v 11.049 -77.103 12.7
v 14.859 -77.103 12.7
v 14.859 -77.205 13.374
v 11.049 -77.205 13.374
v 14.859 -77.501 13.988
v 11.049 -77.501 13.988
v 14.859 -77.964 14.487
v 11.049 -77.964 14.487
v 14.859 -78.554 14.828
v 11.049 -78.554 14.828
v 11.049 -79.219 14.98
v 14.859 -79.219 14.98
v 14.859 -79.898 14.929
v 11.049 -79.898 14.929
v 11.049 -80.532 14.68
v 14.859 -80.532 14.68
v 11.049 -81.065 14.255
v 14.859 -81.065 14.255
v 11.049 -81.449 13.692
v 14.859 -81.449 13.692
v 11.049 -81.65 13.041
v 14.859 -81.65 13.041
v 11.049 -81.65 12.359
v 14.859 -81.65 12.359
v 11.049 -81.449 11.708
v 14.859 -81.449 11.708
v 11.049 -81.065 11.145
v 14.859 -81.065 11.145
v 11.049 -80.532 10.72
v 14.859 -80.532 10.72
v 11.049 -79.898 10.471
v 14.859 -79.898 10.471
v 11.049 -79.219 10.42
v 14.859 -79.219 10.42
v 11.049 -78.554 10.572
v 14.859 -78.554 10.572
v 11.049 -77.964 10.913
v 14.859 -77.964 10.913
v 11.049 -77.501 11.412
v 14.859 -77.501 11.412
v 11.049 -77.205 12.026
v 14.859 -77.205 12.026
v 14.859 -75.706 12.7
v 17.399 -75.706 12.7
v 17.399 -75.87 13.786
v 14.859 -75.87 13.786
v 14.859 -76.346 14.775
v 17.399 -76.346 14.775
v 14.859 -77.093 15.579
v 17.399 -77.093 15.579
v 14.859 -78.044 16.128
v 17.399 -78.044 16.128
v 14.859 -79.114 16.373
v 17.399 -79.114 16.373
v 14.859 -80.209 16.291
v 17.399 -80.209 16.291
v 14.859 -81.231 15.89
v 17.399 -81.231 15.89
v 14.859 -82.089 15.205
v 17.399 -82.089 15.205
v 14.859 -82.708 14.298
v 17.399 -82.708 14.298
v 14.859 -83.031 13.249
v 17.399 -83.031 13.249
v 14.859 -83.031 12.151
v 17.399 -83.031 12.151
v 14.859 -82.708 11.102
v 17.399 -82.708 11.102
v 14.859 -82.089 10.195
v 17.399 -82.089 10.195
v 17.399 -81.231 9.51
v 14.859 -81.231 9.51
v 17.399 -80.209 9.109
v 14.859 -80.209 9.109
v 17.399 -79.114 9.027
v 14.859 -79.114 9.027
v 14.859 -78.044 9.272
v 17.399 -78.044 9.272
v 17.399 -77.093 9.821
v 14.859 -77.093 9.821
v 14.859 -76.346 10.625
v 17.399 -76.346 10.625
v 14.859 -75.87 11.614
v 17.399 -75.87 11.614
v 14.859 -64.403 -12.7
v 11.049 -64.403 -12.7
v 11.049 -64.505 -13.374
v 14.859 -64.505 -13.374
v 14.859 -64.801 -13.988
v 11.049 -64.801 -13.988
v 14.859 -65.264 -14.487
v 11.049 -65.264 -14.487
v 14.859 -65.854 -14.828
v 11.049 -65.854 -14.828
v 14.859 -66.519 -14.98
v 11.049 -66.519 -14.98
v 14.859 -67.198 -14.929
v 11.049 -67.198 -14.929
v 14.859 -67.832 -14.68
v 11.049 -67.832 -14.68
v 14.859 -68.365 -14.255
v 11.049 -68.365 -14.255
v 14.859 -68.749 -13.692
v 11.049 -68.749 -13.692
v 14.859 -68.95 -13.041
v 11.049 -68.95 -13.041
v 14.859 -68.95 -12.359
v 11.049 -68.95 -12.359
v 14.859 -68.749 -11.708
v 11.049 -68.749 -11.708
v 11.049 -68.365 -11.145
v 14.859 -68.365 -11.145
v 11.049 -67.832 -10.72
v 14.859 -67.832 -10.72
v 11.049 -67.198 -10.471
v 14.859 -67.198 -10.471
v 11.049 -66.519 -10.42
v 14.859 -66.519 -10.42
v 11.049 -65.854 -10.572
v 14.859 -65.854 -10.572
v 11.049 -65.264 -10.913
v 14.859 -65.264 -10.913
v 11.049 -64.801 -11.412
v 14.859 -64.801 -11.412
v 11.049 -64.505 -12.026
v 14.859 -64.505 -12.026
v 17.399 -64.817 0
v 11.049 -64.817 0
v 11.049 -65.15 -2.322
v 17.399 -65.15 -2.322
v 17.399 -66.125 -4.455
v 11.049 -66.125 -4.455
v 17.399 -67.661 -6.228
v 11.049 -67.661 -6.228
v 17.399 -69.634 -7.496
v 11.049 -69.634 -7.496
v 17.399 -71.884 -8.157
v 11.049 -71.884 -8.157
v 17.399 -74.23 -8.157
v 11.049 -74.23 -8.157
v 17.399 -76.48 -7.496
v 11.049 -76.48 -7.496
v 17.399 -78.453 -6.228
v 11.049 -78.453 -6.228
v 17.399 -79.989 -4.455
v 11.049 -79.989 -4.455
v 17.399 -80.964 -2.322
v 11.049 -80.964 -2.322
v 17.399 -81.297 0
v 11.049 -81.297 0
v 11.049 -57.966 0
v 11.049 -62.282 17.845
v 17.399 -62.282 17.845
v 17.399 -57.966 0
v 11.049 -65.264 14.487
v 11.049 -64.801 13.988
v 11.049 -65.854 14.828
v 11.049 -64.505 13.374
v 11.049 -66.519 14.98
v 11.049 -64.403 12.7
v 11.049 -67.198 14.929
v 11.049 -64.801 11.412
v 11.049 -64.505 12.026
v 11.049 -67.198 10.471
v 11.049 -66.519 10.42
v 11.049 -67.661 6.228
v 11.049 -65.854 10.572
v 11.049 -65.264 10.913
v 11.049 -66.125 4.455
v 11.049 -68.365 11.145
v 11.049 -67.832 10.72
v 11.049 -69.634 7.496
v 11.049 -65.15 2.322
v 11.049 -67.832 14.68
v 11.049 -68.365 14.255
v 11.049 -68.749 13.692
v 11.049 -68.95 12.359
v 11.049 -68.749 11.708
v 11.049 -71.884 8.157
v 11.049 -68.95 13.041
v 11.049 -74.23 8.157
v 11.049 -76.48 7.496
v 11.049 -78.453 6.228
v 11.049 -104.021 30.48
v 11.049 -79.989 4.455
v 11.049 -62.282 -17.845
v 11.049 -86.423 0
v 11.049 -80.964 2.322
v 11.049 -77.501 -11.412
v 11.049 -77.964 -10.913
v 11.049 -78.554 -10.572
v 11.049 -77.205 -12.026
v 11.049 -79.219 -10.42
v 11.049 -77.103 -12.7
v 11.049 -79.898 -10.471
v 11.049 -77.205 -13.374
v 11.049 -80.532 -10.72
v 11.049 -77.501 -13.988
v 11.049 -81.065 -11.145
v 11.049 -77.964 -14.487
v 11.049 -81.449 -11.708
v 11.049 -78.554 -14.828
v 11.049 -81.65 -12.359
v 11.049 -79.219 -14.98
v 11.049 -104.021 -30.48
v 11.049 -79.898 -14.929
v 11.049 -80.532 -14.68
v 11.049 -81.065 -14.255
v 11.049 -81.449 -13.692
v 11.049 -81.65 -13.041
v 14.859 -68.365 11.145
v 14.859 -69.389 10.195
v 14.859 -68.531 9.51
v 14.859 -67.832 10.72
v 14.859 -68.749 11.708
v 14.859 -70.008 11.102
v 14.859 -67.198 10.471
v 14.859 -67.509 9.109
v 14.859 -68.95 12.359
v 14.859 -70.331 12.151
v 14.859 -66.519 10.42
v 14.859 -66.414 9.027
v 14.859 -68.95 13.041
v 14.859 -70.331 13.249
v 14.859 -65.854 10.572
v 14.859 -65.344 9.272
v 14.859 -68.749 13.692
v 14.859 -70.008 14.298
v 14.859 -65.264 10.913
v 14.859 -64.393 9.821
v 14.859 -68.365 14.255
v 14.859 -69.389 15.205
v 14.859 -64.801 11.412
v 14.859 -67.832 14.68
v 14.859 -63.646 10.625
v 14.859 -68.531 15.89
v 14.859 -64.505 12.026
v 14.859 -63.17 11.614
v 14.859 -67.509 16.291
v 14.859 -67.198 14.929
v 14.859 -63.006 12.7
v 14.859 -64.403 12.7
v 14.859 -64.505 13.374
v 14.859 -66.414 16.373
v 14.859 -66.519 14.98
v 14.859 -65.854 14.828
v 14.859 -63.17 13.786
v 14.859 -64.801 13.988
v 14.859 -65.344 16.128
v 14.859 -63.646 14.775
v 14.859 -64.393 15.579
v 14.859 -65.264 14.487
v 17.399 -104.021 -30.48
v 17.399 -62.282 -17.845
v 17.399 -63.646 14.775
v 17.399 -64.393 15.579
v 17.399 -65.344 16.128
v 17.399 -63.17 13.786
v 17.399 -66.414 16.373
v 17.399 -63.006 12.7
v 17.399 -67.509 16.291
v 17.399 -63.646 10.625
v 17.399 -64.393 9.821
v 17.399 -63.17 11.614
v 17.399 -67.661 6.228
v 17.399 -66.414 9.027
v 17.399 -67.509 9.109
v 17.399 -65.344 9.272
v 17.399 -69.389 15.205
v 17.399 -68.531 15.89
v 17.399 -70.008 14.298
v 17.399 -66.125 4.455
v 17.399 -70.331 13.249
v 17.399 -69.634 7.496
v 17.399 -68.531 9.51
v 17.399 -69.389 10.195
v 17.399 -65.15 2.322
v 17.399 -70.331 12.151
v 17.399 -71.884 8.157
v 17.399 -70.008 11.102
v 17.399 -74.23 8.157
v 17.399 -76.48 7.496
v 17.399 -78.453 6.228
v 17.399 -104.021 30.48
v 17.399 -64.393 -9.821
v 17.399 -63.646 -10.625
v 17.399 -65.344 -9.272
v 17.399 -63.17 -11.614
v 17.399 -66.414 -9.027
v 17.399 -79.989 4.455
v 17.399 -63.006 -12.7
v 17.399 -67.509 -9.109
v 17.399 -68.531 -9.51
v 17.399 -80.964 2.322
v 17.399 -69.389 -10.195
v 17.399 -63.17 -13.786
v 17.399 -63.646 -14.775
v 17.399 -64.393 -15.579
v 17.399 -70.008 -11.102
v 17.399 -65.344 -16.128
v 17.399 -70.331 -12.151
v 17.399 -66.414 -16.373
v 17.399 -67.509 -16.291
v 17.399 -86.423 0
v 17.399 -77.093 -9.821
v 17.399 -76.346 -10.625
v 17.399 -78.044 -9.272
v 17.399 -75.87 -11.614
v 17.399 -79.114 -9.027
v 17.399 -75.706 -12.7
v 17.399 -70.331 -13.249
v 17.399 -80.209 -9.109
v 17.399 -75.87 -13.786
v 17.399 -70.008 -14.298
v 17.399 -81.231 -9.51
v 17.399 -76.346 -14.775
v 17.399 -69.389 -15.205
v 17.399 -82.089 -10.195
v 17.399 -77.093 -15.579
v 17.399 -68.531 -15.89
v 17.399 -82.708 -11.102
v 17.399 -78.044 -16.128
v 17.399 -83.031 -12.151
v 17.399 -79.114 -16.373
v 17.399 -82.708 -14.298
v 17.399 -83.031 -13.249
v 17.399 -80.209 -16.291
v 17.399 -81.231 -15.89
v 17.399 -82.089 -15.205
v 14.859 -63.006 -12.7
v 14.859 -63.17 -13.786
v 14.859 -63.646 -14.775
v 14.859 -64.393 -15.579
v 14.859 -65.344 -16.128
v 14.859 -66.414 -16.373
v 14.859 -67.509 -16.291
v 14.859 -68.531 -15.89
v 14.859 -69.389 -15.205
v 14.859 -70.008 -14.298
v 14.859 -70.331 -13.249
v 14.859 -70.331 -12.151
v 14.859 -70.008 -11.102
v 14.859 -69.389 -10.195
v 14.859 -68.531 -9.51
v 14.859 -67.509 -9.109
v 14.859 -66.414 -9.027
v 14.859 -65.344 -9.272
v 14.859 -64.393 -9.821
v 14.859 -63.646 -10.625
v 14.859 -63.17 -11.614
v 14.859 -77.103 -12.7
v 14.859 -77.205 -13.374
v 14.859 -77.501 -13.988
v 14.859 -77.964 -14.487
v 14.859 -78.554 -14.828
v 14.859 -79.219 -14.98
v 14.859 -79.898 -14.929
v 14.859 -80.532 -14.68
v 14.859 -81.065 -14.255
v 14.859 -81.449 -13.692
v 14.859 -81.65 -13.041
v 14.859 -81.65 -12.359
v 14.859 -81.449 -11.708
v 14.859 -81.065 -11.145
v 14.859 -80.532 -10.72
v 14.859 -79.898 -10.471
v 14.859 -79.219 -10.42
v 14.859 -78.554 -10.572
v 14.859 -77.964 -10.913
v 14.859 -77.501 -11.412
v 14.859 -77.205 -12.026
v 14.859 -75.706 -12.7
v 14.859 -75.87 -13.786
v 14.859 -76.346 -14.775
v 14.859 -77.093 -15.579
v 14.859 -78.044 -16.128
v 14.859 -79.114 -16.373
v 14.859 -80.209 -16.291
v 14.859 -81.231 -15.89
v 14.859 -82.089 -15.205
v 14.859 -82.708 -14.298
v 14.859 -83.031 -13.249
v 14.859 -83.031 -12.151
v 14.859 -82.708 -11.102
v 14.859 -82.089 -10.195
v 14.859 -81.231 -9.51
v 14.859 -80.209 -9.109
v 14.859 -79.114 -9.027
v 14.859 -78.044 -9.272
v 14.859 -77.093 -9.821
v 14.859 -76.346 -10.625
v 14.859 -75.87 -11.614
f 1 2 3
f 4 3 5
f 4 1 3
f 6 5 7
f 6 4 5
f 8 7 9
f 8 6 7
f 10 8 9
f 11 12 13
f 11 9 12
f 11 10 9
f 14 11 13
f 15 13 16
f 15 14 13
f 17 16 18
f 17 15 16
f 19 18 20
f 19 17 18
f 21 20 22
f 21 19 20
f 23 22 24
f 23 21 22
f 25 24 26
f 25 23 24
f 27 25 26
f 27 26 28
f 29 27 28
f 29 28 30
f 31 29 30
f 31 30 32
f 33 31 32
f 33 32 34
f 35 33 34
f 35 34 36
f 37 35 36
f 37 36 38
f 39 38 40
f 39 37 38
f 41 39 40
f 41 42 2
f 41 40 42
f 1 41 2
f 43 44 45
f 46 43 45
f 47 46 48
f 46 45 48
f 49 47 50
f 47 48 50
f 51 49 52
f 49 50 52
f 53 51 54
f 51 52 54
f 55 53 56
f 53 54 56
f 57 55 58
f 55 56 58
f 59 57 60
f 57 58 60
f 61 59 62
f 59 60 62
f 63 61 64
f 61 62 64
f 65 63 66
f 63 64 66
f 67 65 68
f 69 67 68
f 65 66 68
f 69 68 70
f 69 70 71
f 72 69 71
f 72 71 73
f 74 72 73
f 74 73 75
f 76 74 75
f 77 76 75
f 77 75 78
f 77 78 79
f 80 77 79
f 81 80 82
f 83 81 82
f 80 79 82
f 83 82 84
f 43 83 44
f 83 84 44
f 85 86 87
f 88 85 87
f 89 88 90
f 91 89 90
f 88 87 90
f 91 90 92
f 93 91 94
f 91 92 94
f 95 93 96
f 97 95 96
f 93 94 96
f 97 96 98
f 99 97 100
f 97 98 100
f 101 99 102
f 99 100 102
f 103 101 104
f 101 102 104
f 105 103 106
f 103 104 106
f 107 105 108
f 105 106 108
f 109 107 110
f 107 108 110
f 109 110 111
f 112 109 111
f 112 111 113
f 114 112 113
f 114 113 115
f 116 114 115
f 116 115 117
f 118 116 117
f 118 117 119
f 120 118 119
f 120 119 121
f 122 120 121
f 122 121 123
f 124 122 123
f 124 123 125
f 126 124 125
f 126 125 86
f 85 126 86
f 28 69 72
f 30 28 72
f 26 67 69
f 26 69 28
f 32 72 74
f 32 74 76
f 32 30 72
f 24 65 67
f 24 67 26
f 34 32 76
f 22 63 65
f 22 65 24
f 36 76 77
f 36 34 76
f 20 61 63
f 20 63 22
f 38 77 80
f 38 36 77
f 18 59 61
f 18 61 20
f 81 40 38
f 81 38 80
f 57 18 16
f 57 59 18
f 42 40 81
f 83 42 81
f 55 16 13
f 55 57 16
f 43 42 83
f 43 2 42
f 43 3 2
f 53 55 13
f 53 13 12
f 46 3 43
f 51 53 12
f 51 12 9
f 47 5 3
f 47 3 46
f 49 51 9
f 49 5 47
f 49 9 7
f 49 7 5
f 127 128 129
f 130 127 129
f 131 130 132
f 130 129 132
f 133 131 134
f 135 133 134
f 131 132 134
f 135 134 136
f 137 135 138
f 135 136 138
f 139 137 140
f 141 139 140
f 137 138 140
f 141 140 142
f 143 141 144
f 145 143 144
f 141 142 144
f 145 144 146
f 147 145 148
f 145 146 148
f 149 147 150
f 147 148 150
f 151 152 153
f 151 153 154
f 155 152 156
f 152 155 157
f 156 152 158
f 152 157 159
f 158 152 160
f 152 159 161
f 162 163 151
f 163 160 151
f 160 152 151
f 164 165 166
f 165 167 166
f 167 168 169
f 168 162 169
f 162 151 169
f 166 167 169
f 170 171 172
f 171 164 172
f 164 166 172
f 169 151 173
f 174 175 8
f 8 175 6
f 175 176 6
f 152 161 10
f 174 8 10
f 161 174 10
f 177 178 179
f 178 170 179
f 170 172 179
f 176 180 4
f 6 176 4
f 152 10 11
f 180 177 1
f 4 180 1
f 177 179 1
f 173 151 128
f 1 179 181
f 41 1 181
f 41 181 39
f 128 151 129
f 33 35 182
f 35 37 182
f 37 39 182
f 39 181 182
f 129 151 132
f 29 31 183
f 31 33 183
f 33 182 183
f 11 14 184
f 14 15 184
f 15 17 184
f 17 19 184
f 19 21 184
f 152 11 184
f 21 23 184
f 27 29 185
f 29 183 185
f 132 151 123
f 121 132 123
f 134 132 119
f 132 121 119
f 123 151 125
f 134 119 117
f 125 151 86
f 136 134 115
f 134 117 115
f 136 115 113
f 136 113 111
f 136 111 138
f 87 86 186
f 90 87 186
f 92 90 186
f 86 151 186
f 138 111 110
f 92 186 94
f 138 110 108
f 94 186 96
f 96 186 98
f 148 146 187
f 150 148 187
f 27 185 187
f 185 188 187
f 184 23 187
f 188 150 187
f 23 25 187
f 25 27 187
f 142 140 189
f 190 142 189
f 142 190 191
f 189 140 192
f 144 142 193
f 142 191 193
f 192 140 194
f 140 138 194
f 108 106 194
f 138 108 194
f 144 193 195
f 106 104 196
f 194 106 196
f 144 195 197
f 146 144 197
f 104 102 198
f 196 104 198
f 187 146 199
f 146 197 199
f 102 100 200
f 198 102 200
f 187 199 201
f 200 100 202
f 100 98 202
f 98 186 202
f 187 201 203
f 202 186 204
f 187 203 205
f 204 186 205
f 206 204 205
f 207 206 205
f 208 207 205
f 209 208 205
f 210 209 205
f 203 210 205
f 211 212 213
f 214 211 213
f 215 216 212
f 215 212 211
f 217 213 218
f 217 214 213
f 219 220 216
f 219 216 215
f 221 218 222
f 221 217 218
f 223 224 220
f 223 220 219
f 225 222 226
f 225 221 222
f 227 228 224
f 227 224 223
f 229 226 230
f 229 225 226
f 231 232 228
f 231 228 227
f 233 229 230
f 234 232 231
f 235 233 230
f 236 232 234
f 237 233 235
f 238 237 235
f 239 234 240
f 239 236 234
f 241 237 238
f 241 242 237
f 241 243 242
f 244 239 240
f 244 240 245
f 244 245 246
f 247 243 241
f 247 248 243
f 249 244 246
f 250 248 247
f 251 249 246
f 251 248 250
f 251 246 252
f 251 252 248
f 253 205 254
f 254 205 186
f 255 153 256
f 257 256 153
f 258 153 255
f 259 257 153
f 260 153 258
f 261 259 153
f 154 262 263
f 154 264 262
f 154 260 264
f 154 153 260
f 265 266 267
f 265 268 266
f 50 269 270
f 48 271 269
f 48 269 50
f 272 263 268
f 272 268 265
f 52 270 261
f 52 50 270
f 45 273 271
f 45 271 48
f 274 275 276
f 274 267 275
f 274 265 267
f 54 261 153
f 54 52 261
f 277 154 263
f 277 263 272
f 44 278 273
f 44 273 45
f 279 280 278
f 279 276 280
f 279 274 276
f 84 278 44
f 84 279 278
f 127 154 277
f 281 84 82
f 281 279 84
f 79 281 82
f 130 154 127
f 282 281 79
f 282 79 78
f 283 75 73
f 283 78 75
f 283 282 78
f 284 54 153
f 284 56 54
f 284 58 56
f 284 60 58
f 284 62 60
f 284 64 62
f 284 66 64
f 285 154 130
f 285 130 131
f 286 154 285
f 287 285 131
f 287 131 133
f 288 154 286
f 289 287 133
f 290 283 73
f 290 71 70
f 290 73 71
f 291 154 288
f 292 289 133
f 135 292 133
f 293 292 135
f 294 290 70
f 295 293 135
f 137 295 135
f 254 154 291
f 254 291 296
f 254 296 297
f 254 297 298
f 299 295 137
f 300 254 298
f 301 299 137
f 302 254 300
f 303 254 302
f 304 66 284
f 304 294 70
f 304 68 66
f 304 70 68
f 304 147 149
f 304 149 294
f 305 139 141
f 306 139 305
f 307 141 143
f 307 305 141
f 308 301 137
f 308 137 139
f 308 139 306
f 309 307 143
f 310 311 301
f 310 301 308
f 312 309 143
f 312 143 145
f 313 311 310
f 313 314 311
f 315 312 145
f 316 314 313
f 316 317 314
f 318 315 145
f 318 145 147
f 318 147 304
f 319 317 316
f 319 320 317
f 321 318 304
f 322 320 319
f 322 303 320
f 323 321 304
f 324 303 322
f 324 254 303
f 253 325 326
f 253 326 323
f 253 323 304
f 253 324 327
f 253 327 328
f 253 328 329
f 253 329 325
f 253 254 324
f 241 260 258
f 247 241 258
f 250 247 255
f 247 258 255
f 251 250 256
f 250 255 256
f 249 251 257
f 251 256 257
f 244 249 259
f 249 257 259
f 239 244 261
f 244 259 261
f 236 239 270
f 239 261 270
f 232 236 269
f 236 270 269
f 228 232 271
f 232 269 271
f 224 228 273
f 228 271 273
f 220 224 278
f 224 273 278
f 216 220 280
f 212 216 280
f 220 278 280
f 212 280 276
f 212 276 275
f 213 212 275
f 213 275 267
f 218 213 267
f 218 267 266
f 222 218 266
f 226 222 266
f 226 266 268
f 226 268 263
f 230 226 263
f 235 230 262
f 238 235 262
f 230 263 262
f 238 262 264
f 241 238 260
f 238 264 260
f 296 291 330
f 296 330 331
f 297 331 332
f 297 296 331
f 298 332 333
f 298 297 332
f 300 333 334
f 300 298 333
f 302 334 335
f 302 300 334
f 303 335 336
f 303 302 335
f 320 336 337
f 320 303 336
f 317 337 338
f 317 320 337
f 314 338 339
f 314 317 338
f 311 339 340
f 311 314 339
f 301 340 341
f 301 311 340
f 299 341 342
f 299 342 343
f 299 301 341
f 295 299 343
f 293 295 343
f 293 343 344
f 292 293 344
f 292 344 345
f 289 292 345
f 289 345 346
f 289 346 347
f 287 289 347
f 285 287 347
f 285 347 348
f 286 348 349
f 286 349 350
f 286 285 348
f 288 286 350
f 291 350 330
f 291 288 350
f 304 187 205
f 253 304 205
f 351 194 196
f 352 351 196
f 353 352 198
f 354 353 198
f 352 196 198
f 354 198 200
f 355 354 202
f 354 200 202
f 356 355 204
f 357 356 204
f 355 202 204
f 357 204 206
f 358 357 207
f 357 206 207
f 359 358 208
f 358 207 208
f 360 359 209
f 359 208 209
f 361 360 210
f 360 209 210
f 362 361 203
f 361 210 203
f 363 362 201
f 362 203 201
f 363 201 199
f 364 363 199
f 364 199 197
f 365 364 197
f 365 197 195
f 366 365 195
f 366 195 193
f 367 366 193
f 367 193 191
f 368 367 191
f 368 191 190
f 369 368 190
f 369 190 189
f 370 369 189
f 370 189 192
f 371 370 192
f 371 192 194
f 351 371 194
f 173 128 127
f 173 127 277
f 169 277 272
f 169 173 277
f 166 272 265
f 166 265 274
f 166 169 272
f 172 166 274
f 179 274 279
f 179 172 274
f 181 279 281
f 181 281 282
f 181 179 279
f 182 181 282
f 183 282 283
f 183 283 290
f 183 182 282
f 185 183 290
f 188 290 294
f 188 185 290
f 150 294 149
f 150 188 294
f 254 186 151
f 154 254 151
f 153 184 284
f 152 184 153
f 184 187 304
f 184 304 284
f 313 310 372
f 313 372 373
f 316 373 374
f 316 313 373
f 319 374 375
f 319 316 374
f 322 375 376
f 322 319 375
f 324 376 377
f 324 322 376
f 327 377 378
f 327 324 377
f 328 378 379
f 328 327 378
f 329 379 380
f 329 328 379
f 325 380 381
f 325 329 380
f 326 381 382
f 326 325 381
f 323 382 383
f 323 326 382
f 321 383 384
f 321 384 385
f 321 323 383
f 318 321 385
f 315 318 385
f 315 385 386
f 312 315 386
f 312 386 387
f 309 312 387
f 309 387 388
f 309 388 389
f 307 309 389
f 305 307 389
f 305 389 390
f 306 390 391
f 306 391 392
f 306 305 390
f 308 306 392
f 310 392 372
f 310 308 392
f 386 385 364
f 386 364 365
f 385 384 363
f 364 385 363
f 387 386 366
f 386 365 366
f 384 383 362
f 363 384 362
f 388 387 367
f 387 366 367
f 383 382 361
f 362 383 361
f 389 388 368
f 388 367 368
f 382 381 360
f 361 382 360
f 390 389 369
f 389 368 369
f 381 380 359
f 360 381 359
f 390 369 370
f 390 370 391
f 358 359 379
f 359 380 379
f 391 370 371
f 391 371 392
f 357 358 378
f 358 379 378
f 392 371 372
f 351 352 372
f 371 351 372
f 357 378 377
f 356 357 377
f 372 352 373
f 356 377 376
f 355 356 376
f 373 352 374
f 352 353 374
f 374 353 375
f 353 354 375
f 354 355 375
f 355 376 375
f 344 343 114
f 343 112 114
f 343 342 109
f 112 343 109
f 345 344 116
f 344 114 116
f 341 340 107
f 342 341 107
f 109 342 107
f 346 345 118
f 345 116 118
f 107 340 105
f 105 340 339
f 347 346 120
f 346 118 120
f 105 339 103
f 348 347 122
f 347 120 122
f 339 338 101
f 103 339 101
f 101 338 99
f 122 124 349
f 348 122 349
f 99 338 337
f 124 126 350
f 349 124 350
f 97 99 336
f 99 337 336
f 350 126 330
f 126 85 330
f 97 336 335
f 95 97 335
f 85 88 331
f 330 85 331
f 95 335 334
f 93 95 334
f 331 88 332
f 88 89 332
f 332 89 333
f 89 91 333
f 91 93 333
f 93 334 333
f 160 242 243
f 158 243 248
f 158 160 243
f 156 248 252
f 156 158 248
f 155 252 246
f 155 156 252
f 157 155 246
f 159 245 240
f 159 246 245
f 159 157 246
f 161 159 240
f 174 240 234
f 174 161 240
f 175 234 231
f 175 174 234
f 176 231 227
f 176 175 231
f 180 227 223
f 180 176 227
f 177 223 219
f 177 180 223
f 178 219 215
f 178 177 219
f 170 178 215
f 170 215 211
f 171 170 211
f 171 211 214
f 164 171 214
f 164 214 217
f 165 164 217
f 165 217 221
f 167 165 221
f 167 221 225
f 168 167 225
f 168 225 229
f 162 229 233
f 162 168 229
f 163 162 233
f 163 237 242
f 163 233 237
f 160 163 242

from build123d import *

# Parameters (mm, degrees)
SKETCH116_R     = 2.286
PAD042_DEPTH    = 6.35
SKETCH117_R     = 3.683
POCKET041_DEPTH = 2.54


with BuildPart() as part:
    # Sketch116 → Pad042 (new body)
    with BuildSketch(Plane.YZ):
        with BuildLine():
            Line((-86.423367, 0), (-104.021003, 30.48))
            Line((-104.021003, 30.48), (-62.282204, 17.844963))
            Line((-62.282204, 17.844963), (-57.965562, 0))
            Line((-64.816504, 0), (-57.965562, 0))
            ThreePointArc((-64.816504, 0), (-73.056938, 8.240434), (-81.297372, 0))
            Line((-86.423367, 0), (-81.297372, 0))
        make_face()
        with Locations((-79.389436, 12.7)):
            Circle(SKETCH116_R, mode=Mode.SUBTRACT)
        with Locations((-66.689436, 12.7)):
            Circle(SKETCH116_R, mode=Mode.SUBTRACT)
    pad042 = extrude(amount=PAD042_DEPTH)

    # Sketch117 → Pocket041 (cut)
    with BuildSketch(Plane.YZ.offset(6.35)):
        with Locations((-79.389436, 12.7)):
            Circle(SKETCH117_R)
        with Locations((-66.689436, 12.7)):
            Circle(SKETCH117_R)
    pocket041 = extrude(amount=-POCKET041_DEPTH, mode=Mode.SUBTRACT)

    # Mirrored003: Pad042, Pocket041 across XY
    add(pad042.mirror(Plane.XY))
    add(pocket041.mirror(Plane.XY), mode=Mode.SUBTRACT)


with BuildPart() as part_1:
    # Body033 placement: moved
    add(part.part.moved(Location((11.049, 0, 0))))


solid = part_1.part
